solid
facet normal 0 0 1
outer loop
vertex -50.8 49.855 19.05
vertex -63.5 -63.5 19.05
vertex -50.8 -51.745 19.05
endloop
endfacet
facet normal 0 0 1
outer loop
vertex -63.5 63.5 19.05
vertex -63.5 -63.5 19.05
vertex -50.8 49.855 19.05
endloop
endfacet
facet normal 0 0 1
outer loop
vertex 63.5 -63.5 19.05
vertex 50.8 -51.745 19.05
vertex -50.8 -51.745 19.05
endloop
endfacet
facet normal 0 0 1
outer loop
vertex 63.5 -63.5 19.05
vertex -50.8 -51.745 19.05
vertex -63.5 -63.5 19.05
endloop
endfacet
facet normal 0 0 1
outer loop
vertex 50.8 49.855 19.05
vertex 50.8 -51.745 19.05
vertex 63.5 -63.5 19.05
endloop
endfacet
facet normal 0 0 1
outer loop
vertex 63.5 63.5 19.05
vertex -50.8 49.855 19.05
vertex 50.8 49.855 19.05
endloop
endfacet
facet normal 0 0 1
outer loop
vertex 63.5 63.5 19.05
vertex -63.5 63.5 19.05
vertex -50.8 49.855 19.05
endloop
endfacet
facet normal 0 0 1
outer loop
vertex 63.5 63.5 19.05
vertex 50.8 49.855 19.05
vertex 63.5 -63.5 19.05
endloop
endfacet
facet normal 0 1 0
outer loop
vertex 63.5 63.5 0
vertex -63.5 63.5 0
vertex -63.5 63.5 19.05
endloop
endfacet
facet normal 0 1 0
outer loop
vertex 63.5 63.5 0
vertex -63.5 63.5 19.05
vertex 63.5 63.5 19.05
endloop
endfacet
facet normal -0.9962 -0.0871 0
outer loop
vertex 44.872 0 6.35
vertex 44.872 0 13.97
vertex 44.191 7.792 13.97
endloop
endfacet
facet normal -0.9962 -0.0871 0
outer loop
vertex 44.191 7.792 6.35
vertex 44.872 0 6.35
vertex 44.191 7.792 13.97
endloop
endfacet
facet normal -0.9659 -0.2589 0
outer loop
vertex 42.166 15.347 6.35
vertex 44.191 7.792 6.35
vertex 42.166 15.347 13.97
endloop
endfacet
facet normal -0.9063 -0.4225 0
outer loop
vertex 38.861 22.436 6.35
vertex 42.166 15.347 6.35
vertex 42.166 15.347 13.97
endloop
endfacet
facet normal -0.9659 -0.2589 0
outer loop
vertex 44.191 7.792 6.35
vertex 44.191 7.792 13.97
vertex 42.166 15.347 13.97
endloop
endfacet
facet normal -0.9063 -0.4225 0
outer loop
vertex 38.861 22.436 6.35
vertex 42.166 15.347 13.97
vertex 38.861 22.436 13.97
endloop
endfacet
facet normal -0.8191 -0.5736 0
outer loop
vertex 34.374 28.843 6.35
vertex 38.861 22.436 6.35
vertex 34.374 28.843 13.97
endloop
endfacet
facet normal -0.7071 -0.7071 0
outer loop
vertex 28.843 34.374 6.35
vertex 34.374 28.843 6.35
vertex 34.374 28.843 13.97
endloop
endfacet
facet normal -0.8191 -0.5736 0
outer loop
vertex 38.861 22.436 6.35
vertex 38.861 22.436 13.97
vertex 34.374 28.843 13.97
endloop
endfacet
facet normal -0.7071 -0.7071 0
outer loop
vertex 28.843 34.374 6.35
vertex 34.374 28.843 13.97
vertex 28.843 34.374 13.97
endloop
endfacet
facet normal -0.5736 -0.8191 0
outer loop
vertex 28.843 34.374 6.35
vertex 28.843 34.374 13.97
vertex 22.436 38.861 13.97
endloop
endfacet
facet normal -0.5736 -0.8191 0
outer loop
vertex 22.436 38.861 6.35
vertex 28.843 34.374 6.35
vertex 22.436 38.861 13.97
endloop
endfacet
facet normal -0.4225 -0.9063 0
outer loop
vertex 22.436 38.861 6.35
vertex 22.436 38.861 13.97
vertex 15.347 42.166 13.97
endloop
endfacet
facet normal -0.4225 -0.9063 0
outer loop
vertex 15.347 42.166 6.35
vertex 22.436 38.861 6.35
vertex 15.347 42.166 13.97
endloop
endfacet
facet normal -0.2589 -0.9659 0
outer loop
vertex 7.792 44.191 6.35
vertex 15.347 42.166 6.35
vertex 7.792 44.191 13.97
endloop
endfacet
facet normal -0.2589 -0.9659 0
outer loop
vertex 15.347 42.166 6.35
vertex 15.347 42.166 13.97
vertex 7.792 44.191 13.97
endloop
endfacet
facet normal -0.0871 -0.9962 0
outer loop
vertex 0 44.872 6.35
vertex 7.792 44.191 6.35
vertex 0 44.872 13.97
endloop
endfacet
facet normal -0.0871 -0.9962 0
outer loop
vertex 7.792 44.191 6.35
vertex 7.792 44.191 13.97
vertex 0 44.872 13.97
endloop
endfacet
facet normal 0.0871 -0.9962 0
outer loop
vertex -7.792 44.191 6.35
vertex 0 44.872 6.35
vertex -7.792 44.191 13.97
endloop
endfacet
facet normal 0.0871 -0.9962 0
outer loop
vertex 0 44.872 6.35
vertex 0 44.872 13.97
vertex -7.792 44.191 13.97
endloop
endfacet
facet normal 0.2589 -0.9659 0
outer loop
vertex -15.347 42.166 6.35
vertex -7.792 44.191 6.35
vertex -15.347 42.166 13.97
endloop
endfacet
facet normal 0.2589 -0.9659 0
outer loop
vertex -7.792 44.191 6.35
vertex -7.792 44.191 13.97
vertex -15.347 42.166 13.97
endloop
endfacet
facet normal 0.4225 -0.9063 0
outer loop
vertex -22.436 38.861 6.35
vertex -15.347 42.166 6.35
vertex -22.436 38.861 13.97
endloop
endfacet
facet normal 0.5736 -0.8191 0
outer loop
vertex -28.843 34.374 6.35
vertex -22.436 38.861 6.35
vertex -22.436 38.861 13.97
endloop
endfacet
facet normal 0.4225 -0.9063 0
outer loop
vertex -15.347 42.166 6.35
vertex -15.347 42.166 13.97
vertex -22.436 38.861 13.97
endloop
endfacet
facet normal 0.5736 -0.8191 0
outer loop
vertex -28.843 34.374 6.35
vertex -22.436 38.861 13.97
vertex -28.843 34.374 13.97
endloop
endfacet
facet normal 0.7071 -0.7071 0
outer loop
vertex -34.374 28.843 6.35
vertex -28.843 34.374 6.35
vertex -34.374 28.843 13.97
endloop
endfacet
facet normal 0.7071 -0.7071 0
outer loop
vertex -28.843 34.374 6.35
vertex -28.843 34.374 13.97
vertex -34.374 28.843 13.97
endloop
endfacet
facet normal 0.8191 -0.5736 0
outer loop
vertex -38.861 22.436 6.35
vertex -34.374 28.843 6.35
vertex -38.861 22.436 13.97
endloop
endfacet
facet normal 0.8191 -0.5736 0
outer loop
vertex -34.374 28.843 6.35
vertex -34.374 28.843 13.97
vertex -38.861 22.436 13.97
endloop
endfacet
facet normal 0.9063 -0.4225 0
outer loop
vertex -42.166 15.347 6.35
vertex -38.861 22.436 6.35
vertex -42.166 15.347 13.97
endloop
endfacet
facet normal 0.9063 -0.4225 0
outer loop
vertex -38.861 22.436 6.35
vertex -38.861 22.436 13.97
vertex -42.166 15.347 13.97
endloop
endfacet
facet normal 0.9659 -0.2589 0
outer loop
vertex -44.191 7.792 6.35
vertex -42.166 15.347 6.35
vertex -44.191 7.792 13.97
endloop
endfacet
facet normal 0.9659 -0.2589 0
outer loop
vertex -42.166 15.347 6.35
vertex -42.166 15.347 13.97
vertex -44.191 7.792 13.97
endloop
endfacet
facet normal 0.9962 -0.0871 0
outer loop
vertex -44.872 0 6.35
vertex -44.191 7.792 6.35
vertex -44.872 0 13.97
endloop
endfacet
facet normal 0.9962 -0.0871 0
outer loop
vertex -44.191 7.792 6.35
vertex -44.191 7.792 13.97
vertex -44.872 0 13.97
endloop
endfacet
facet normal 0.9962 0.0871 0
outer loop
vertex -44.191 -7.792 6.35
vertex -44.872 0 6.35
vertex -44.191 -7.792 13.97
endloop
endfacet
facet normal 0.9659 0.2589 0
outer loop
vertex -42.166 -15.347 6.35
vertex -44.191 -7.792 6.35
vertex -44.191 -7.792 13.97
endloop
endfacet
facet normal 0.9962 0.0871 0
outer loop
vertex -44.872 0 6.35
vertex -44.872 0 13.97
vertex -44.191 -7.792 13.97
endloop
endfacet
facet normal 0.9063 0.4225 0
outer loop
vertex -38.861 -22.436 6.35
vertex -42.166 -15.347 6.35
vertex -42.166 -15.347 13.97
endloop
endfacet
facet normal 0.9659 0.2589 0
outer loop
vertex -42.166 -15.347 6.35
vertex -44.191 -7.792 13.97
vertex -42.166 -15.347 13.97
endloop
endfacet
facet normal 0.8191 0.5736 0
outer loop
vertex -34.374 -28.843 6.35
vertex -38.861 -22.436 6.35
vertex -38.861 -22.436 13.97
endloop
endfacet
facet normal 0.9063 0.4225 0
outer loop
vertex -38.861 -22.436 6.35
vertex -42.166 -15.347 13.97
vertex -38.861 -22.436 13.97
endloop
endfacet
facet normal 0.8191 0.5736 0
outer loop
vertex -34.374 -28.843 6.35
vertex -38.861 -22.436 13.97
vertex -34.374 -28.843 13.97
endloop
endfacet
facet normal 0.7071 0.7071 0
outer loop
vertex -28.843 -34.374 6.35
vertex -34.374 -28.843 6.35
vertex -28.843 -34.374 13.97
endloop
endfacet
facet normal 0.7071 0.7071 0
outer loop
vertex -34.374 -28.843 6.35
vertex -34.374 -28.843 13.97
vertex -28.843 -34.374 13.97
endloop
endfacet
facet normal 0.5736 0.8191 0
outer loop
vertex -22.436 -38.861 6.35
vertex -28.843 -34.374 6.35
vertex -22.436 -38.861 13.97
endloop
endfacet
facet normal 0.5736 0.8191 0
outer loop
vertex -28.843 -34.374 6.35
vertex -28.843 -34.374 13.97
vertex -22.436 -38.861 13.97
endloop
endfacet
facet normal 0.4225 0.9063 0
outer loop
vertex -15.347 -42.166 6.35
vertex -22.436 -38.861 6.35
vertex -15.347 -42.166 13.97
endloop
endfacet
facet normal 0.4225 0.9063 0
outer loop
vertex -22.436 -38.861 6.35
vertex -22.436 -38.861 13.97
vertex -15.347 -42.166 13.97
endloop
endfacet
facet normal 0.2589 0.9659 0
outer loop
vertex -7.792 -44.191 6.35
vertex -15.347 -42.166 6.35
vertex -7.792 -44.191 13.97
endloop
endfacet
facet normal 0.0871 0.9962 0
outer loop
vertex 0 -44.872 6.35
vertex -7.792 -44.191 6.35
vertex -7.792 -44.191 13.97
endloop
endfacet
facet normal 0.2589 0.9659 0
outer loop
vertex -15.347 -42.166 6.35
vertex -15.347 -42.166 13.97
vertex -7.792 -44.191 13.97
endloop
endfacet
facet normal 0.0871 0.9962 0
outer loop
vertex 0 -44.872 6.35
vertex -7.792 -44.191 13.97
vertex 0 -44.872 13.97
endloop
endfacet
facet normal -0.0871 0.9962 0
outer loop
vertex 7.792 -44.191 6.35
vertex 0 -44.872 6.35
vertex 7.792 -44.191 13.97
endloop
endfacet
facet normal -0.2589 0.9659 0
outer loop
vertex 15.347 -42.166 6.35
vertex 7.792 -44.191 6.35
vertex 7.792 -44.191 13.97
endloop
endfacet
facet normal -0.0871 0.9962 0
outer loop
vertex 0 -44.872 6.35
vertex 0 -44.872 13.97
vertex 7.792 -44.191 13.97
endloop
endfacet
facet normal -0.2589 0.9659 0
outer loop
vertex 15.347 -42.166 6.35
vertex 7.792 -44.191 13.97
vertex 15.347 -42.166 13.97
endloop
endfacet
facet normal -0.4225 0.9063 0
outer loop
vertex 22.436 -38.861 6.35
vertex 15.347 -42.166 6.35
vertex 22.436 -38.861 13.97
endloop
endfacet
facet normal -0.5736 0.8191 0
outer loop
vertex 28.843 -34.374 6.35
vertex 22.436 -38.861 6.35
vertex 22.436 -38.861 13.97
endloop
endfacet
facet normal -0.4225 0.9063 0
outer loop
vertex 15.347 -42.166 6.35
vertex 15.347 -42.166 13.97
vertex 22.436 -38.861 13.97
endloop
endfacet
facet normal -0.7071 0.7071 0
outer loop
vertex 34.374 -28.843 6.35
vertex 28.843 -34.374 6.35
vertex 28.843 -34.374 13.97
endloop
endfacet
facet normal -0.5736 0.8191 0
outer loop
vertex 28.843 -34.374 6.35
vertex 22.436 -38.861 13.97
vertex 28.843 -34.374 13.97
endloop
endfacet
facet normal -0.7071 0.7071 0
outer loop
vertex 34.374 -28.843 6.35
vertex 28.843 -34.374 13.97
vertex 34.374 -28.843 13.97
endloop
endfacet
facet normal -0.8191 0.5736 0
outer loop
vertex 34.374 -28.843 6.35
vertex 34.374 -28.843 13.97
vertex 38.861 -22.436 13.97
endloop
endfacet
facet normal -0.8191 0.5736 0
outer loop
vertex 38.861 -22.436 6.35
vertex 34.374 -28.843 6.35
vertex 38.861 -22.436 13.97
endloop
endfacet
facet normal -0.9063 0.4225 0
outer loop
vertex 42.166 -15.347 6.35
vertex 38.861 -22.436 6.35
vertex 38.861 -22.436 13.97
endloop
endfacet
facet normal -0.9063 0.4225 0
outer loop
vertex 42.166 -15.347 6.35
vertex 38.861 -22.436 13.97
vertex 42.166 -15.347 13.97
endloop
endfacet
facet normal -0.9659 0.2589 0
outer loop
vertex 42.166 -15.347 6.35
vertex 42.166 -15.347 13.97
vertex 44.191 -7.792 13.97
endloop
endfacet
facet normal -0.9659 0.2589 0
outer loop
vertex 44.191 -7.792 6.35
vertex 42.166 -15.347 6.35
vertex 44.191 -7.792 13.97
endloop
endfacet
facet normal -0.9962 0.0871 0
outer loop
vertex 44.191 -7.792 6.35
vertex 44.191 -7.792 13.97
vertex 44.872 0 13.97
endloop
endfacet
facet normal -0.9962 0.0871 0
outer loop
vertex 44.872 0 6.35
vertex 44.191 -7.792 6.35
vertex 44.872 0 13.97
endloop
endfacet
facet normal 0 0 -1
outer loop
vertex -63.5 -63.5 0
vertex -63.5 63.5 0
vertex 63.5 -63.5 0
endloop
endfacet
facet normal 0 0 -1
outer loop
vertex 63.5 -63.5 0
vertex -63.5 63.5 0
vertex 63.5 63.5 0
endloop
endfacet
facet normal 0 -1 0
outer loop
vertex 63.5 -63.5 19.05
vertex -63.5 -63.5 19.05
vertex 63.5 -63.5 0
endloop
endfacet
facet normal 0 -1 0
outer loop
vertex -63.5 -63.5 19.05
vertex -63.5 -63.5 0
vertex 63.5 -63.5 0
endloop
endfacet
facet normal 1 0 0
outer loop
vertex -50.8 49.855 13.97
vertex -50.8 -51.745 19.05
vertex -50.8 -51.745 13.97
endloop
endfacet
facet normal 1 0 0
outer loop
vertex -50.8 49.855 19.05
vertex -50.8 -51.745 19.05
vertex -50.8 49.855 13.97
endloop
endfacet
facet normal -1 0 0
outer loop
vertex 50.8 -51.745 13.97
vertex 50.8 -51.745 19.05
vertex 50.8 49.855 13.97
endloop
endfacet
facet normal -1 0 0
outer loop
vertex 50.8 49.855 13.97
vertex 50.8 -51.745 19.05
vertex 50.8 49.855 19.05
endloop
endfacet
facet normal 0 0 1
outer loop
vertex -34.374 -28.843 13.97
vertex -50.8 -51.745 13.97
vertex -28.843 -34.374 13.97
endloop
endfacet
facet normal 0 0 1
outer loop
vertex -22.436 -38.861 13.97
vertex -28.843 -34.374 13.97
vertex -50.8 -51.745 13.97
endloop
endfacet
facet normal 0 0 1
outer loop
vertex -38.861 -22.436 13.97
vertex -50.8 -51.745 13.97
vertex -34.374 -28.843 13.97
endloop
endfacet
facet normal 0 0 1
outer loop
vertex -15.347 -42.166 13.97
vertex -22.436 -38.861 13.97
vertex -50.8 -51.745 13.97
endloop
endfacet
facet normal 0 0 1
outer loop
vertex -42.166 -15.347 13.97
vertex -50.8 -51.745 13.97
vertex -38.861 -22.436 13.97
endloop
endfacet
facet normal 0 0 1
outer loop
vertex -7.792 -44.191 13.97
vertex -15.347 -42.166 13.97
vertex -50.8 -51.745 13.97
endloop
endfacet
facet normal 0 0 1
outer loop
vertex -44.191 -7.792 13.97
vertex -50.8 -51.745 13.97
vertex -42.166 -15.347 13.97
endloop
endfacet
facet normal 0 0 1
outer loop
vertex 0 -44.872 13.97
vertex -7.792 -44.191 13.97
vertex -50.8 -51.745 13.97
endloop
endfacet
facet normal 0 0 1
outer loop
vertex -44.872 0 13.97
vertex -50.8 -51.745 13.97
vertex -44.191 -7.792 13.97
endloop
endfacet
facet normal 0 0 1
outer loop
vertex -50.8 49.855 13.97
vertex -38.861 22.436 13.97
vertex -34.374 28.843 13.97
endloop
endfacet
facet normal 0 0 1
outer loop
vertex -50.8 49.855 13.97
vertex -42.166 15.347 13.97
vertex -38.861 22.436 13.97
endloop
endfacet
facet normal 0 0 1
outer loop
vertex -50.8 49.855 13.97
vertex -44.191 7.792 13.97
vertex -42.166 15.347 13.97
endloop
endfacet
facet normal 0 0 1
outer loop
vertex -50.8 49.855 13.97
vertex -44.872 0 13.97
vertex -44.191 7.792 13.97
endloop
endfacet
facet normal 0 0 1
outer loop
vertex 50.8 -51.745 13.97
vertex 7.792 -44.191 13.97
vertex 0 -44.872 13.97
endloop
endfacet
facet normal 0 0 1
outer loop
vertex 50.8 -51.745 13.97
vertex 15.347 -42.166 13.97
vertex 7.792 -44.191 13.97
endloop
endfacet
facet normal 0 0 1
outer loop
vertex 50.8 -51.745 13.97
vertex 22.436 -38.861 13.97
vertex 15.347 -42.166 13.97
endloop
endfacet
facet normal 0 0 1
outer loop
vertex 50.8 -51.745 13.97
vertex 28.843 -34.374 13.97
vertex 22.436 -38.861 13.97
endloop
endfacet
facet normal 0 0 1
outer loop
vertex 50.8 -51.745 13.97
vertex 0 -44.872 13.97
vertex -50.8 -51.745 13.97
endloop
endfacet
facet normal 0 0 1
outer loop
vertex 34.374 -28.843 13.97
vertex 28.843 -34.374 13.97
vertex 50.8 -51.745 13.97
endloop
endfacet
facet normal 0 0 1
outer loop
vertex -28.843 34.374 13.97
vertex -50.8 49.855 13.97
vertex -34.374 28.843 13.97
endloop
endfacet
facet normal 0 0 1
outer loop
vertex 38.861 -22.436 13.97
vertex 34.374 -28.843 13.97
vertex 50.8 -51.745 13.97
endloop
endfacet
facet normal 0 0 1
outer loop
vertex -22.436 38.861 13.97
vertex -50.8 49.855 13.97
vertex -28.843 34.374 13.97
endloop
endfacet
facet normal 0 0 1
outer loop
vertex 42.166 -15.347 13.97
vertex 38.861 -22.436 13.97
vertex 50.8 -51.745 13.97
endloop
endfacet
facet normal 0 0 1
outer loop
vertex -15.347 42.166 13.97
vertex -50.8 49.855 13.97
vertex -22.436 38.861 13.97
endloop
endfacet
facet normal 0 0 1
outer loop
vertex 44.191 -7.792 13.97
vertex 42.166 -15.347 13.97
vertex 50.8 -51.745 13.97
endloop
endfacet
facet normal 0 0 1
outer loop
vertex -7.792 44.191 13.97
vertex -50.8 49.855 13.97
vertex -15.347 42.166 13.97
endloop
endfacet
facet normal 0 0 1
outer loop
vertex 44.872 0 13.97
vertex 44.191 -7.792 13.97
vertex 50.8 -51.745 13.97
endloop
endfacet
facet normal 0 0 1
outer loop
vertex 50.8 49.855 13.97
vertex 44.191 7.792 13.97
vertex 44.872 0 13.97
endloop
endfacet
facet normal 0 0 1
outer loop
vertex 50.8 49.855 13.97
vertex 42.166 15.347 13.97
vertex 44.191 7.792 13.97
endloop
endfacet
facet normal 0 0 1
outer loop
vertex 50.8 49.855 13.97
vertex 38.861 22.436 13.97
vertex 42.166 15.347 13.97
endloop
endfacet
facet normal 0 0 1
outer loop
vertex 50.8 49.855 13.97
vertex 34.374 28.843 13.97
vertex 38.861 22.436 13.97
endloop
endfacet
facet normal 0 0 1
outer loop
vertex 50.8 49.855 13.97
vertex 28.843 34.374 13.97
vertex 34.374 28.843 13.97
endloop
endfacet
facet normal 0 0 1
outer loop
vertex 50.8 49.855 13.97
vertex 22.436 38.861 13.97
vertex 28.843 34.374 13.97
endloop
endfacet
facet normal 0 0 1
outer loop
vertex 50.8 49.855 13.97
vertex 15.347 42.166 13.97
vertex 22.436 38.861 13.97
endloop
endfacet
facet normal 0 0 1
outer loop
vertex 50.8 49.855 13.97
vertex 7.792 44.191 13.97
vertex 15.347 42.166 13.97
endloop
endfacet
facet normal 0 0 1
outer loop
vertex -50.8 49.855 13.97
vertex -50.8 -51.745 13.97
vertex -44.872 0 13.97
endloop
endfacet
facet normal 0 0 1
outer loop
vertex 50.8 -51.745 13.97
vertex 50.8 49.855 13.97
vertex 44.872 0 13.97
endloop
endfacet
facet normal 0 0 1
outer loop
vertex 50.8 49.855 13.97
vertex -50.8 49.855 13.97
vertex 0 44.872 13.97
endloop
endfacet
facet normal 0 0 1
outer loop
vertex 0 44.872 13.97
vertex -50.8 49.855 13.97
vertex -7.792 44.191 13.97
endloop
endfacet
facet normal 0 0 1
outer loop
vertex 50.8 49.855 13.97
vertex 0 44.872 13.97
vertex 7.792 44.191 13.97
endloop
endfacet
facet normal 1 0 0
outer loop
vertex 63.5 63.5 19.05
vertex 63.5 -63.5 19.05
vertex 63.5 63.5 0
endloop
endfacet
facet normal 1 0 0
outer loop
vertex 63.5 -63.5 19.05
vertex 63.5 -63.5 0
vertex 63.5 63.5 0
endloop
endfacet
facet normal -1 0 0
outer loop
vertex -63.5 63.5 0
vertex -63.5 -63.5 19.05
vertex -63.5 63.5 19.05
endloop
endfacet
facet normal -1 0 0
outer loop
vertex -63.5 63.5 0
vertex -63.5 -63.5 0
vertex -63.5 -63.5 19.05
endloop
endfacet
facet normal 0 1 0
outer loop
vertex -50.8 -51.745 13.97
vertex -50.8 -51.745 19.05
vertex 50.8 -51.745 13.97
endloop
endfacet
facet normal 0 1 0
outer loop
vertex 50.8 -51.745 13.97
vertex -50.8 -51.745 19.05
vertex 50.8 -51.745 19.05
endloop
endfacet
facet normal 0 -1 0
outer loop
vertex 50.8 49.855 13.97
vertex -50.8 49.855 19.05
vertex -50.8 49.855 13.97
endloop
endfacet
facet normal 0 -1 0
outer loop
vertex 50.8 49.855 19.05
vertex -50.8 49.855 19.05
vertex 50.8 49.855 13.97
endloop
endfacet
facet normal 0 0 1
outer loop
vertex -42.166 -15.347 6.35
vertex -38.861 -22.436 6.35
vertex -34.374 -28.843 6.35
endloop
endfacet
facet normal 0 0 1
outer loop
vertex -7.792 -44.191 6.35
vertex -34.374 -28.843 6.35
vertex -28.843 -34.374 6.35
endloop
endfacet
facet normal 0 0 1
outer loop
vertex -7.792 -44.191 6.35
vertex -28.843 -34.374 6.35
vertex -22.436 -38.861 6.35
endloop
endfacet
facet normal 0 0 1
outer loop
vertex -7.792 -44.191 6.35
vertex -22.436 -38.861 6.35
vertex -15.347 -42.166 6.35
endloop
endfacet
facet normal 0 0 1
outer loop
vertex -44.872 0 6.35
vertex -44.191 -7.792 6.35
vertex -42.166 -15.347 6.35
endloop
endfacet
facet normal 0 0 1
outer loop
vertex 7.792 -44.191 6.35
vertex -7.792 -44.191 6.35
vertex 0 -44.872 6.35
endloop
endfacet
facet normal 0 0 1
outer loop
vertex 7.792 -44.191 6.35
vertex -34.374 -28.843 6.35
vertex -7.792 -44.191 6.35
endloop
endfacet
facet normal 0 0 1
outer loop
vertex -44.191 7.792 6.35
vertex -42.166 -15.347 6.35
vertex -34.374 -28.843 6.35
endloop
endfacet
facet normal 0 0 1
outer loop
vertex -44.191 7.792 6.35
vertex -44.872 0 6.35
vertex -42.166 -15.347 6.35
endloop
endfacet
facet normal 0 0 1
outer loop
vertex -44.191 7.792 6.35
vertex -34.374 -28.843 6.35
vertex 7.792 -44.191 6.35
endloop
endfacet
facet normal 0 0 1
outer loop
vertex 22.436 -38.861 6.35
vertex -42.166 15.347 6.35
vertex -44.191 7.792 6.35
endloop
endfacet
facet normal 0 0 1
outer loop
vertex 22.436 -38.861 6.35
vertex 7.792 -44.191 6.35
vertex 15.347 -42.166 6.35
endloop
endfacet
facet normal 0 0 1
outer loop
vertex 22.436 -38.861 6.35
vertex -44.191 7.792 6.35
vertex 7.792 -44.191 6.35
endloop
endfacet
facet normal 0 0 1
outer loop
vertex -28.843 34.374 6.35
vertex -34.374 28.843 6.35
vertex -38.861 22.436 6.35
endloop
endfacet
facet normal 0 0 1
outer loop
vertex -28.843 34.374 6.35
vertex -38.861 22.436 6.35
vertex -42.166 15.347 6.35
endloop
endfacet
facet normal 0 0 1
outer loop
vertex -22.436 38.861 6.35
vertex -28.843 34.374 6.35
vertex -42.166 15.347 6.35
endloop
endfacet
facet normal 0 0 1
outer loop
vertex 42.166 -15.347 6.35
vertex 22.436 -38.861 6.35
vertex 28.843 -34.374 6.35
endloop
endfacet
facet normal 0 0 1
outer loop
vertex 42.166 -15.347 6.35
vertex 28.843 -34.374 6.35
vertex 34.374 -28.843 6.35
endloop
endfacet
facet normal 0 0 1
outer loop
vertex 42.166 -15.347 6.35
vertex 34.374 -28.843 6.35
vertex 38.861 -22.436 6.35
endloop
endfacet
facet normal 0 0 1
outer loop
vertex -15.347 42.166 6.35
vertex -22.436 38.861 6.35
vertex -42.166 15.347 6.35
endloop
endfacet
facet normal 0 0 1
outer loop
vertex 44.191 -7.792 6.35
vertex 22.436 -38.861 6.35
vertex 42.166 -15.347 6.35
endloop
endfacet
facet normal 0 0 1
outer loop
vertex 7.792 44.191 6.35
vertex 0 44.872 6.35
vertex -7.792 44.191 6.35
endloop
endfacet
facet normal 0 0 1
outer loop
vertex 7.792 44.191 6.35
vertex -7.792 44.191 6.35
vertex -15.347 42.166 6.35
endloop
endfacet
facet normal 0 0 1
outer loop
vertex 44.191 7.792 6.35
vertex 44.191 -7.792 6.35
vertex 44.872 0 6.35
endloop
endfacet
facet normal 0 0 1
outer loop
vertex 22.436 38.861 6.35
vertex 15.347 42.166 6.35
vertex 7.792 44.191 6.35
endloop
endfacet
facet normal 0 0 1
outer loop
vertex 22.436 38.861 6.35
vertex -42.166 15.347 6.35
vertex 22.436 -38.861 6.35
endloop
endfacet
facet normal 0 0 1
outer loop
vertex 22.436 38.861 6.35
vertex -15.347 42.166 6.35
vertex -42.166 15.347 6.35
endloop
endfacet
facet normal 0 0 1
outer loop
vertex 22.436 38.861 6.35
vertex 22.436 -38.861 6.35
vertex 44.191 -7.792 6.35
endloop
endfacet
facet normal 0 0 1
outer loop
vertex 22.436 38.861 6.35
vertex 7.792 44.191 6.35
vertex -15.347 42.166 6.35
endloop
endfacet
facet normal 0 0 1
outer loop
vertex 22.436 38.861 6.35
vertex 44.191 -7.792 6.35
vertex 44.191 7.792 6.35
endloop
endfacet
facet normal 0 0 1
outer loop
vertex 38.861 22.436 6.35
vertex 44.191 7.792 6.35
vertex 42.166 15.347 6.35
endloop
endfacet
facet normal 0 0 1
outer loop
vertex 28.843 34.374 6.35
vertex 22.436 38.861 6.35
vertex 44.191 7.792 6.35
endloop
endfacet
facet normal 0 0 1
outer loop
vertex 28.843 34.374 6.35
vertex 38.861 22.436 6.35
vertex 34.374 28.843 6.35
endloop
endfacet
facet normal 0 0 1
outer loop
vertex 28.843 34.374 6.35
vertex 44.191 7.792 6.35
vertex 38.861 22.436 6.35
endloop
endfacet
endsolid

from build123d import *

# Parameters (mm, degrees)
F0_W     = 127
F0_H     = 127
F1_DEPTH = 7.62
F2_W     = 127
F2_H     = 127
F3_DEPTH = 11.43
F4_W     = 101.6
F4_H     = 101.6
F5_DEPTH = 5.08
F6_R     = 44.872379
F7_DEPTH = 7.62


with BuildPart() as f1:
    # F0 (on Top) → F1 (new body)
    with BuildSketch(Plane.XY):
        Rectangle(F0_W, F0_H)
    extrude(amount=F1_DEPTH)

    # F2 (on face) → F3 (join)
    with BuildSketch(Plane.XY.offset(7.62)):
        Rectangle(F2_W, F2_H)
    extrude(amount=F3_DEPTH)

    # F4 (on face) → F5 (cut)
    with BuildSketch(Plane.XY.offset(19.05)):
        with Locations((0, -0.944678)):
            Rectangle(F4_W, F4_H)
    extrude(amount=-F5_DEPTH, mode=Mode.SUBTRACT)

    # F6 (on face) → F7 (cut)
    with BuildSketch(Plane.XY.offset(13.97)):
        Circle(F6_R)
    extrude(amount=-F7_DEPTH, mode=Mode.SUBTRACT)


solid = f1.part
